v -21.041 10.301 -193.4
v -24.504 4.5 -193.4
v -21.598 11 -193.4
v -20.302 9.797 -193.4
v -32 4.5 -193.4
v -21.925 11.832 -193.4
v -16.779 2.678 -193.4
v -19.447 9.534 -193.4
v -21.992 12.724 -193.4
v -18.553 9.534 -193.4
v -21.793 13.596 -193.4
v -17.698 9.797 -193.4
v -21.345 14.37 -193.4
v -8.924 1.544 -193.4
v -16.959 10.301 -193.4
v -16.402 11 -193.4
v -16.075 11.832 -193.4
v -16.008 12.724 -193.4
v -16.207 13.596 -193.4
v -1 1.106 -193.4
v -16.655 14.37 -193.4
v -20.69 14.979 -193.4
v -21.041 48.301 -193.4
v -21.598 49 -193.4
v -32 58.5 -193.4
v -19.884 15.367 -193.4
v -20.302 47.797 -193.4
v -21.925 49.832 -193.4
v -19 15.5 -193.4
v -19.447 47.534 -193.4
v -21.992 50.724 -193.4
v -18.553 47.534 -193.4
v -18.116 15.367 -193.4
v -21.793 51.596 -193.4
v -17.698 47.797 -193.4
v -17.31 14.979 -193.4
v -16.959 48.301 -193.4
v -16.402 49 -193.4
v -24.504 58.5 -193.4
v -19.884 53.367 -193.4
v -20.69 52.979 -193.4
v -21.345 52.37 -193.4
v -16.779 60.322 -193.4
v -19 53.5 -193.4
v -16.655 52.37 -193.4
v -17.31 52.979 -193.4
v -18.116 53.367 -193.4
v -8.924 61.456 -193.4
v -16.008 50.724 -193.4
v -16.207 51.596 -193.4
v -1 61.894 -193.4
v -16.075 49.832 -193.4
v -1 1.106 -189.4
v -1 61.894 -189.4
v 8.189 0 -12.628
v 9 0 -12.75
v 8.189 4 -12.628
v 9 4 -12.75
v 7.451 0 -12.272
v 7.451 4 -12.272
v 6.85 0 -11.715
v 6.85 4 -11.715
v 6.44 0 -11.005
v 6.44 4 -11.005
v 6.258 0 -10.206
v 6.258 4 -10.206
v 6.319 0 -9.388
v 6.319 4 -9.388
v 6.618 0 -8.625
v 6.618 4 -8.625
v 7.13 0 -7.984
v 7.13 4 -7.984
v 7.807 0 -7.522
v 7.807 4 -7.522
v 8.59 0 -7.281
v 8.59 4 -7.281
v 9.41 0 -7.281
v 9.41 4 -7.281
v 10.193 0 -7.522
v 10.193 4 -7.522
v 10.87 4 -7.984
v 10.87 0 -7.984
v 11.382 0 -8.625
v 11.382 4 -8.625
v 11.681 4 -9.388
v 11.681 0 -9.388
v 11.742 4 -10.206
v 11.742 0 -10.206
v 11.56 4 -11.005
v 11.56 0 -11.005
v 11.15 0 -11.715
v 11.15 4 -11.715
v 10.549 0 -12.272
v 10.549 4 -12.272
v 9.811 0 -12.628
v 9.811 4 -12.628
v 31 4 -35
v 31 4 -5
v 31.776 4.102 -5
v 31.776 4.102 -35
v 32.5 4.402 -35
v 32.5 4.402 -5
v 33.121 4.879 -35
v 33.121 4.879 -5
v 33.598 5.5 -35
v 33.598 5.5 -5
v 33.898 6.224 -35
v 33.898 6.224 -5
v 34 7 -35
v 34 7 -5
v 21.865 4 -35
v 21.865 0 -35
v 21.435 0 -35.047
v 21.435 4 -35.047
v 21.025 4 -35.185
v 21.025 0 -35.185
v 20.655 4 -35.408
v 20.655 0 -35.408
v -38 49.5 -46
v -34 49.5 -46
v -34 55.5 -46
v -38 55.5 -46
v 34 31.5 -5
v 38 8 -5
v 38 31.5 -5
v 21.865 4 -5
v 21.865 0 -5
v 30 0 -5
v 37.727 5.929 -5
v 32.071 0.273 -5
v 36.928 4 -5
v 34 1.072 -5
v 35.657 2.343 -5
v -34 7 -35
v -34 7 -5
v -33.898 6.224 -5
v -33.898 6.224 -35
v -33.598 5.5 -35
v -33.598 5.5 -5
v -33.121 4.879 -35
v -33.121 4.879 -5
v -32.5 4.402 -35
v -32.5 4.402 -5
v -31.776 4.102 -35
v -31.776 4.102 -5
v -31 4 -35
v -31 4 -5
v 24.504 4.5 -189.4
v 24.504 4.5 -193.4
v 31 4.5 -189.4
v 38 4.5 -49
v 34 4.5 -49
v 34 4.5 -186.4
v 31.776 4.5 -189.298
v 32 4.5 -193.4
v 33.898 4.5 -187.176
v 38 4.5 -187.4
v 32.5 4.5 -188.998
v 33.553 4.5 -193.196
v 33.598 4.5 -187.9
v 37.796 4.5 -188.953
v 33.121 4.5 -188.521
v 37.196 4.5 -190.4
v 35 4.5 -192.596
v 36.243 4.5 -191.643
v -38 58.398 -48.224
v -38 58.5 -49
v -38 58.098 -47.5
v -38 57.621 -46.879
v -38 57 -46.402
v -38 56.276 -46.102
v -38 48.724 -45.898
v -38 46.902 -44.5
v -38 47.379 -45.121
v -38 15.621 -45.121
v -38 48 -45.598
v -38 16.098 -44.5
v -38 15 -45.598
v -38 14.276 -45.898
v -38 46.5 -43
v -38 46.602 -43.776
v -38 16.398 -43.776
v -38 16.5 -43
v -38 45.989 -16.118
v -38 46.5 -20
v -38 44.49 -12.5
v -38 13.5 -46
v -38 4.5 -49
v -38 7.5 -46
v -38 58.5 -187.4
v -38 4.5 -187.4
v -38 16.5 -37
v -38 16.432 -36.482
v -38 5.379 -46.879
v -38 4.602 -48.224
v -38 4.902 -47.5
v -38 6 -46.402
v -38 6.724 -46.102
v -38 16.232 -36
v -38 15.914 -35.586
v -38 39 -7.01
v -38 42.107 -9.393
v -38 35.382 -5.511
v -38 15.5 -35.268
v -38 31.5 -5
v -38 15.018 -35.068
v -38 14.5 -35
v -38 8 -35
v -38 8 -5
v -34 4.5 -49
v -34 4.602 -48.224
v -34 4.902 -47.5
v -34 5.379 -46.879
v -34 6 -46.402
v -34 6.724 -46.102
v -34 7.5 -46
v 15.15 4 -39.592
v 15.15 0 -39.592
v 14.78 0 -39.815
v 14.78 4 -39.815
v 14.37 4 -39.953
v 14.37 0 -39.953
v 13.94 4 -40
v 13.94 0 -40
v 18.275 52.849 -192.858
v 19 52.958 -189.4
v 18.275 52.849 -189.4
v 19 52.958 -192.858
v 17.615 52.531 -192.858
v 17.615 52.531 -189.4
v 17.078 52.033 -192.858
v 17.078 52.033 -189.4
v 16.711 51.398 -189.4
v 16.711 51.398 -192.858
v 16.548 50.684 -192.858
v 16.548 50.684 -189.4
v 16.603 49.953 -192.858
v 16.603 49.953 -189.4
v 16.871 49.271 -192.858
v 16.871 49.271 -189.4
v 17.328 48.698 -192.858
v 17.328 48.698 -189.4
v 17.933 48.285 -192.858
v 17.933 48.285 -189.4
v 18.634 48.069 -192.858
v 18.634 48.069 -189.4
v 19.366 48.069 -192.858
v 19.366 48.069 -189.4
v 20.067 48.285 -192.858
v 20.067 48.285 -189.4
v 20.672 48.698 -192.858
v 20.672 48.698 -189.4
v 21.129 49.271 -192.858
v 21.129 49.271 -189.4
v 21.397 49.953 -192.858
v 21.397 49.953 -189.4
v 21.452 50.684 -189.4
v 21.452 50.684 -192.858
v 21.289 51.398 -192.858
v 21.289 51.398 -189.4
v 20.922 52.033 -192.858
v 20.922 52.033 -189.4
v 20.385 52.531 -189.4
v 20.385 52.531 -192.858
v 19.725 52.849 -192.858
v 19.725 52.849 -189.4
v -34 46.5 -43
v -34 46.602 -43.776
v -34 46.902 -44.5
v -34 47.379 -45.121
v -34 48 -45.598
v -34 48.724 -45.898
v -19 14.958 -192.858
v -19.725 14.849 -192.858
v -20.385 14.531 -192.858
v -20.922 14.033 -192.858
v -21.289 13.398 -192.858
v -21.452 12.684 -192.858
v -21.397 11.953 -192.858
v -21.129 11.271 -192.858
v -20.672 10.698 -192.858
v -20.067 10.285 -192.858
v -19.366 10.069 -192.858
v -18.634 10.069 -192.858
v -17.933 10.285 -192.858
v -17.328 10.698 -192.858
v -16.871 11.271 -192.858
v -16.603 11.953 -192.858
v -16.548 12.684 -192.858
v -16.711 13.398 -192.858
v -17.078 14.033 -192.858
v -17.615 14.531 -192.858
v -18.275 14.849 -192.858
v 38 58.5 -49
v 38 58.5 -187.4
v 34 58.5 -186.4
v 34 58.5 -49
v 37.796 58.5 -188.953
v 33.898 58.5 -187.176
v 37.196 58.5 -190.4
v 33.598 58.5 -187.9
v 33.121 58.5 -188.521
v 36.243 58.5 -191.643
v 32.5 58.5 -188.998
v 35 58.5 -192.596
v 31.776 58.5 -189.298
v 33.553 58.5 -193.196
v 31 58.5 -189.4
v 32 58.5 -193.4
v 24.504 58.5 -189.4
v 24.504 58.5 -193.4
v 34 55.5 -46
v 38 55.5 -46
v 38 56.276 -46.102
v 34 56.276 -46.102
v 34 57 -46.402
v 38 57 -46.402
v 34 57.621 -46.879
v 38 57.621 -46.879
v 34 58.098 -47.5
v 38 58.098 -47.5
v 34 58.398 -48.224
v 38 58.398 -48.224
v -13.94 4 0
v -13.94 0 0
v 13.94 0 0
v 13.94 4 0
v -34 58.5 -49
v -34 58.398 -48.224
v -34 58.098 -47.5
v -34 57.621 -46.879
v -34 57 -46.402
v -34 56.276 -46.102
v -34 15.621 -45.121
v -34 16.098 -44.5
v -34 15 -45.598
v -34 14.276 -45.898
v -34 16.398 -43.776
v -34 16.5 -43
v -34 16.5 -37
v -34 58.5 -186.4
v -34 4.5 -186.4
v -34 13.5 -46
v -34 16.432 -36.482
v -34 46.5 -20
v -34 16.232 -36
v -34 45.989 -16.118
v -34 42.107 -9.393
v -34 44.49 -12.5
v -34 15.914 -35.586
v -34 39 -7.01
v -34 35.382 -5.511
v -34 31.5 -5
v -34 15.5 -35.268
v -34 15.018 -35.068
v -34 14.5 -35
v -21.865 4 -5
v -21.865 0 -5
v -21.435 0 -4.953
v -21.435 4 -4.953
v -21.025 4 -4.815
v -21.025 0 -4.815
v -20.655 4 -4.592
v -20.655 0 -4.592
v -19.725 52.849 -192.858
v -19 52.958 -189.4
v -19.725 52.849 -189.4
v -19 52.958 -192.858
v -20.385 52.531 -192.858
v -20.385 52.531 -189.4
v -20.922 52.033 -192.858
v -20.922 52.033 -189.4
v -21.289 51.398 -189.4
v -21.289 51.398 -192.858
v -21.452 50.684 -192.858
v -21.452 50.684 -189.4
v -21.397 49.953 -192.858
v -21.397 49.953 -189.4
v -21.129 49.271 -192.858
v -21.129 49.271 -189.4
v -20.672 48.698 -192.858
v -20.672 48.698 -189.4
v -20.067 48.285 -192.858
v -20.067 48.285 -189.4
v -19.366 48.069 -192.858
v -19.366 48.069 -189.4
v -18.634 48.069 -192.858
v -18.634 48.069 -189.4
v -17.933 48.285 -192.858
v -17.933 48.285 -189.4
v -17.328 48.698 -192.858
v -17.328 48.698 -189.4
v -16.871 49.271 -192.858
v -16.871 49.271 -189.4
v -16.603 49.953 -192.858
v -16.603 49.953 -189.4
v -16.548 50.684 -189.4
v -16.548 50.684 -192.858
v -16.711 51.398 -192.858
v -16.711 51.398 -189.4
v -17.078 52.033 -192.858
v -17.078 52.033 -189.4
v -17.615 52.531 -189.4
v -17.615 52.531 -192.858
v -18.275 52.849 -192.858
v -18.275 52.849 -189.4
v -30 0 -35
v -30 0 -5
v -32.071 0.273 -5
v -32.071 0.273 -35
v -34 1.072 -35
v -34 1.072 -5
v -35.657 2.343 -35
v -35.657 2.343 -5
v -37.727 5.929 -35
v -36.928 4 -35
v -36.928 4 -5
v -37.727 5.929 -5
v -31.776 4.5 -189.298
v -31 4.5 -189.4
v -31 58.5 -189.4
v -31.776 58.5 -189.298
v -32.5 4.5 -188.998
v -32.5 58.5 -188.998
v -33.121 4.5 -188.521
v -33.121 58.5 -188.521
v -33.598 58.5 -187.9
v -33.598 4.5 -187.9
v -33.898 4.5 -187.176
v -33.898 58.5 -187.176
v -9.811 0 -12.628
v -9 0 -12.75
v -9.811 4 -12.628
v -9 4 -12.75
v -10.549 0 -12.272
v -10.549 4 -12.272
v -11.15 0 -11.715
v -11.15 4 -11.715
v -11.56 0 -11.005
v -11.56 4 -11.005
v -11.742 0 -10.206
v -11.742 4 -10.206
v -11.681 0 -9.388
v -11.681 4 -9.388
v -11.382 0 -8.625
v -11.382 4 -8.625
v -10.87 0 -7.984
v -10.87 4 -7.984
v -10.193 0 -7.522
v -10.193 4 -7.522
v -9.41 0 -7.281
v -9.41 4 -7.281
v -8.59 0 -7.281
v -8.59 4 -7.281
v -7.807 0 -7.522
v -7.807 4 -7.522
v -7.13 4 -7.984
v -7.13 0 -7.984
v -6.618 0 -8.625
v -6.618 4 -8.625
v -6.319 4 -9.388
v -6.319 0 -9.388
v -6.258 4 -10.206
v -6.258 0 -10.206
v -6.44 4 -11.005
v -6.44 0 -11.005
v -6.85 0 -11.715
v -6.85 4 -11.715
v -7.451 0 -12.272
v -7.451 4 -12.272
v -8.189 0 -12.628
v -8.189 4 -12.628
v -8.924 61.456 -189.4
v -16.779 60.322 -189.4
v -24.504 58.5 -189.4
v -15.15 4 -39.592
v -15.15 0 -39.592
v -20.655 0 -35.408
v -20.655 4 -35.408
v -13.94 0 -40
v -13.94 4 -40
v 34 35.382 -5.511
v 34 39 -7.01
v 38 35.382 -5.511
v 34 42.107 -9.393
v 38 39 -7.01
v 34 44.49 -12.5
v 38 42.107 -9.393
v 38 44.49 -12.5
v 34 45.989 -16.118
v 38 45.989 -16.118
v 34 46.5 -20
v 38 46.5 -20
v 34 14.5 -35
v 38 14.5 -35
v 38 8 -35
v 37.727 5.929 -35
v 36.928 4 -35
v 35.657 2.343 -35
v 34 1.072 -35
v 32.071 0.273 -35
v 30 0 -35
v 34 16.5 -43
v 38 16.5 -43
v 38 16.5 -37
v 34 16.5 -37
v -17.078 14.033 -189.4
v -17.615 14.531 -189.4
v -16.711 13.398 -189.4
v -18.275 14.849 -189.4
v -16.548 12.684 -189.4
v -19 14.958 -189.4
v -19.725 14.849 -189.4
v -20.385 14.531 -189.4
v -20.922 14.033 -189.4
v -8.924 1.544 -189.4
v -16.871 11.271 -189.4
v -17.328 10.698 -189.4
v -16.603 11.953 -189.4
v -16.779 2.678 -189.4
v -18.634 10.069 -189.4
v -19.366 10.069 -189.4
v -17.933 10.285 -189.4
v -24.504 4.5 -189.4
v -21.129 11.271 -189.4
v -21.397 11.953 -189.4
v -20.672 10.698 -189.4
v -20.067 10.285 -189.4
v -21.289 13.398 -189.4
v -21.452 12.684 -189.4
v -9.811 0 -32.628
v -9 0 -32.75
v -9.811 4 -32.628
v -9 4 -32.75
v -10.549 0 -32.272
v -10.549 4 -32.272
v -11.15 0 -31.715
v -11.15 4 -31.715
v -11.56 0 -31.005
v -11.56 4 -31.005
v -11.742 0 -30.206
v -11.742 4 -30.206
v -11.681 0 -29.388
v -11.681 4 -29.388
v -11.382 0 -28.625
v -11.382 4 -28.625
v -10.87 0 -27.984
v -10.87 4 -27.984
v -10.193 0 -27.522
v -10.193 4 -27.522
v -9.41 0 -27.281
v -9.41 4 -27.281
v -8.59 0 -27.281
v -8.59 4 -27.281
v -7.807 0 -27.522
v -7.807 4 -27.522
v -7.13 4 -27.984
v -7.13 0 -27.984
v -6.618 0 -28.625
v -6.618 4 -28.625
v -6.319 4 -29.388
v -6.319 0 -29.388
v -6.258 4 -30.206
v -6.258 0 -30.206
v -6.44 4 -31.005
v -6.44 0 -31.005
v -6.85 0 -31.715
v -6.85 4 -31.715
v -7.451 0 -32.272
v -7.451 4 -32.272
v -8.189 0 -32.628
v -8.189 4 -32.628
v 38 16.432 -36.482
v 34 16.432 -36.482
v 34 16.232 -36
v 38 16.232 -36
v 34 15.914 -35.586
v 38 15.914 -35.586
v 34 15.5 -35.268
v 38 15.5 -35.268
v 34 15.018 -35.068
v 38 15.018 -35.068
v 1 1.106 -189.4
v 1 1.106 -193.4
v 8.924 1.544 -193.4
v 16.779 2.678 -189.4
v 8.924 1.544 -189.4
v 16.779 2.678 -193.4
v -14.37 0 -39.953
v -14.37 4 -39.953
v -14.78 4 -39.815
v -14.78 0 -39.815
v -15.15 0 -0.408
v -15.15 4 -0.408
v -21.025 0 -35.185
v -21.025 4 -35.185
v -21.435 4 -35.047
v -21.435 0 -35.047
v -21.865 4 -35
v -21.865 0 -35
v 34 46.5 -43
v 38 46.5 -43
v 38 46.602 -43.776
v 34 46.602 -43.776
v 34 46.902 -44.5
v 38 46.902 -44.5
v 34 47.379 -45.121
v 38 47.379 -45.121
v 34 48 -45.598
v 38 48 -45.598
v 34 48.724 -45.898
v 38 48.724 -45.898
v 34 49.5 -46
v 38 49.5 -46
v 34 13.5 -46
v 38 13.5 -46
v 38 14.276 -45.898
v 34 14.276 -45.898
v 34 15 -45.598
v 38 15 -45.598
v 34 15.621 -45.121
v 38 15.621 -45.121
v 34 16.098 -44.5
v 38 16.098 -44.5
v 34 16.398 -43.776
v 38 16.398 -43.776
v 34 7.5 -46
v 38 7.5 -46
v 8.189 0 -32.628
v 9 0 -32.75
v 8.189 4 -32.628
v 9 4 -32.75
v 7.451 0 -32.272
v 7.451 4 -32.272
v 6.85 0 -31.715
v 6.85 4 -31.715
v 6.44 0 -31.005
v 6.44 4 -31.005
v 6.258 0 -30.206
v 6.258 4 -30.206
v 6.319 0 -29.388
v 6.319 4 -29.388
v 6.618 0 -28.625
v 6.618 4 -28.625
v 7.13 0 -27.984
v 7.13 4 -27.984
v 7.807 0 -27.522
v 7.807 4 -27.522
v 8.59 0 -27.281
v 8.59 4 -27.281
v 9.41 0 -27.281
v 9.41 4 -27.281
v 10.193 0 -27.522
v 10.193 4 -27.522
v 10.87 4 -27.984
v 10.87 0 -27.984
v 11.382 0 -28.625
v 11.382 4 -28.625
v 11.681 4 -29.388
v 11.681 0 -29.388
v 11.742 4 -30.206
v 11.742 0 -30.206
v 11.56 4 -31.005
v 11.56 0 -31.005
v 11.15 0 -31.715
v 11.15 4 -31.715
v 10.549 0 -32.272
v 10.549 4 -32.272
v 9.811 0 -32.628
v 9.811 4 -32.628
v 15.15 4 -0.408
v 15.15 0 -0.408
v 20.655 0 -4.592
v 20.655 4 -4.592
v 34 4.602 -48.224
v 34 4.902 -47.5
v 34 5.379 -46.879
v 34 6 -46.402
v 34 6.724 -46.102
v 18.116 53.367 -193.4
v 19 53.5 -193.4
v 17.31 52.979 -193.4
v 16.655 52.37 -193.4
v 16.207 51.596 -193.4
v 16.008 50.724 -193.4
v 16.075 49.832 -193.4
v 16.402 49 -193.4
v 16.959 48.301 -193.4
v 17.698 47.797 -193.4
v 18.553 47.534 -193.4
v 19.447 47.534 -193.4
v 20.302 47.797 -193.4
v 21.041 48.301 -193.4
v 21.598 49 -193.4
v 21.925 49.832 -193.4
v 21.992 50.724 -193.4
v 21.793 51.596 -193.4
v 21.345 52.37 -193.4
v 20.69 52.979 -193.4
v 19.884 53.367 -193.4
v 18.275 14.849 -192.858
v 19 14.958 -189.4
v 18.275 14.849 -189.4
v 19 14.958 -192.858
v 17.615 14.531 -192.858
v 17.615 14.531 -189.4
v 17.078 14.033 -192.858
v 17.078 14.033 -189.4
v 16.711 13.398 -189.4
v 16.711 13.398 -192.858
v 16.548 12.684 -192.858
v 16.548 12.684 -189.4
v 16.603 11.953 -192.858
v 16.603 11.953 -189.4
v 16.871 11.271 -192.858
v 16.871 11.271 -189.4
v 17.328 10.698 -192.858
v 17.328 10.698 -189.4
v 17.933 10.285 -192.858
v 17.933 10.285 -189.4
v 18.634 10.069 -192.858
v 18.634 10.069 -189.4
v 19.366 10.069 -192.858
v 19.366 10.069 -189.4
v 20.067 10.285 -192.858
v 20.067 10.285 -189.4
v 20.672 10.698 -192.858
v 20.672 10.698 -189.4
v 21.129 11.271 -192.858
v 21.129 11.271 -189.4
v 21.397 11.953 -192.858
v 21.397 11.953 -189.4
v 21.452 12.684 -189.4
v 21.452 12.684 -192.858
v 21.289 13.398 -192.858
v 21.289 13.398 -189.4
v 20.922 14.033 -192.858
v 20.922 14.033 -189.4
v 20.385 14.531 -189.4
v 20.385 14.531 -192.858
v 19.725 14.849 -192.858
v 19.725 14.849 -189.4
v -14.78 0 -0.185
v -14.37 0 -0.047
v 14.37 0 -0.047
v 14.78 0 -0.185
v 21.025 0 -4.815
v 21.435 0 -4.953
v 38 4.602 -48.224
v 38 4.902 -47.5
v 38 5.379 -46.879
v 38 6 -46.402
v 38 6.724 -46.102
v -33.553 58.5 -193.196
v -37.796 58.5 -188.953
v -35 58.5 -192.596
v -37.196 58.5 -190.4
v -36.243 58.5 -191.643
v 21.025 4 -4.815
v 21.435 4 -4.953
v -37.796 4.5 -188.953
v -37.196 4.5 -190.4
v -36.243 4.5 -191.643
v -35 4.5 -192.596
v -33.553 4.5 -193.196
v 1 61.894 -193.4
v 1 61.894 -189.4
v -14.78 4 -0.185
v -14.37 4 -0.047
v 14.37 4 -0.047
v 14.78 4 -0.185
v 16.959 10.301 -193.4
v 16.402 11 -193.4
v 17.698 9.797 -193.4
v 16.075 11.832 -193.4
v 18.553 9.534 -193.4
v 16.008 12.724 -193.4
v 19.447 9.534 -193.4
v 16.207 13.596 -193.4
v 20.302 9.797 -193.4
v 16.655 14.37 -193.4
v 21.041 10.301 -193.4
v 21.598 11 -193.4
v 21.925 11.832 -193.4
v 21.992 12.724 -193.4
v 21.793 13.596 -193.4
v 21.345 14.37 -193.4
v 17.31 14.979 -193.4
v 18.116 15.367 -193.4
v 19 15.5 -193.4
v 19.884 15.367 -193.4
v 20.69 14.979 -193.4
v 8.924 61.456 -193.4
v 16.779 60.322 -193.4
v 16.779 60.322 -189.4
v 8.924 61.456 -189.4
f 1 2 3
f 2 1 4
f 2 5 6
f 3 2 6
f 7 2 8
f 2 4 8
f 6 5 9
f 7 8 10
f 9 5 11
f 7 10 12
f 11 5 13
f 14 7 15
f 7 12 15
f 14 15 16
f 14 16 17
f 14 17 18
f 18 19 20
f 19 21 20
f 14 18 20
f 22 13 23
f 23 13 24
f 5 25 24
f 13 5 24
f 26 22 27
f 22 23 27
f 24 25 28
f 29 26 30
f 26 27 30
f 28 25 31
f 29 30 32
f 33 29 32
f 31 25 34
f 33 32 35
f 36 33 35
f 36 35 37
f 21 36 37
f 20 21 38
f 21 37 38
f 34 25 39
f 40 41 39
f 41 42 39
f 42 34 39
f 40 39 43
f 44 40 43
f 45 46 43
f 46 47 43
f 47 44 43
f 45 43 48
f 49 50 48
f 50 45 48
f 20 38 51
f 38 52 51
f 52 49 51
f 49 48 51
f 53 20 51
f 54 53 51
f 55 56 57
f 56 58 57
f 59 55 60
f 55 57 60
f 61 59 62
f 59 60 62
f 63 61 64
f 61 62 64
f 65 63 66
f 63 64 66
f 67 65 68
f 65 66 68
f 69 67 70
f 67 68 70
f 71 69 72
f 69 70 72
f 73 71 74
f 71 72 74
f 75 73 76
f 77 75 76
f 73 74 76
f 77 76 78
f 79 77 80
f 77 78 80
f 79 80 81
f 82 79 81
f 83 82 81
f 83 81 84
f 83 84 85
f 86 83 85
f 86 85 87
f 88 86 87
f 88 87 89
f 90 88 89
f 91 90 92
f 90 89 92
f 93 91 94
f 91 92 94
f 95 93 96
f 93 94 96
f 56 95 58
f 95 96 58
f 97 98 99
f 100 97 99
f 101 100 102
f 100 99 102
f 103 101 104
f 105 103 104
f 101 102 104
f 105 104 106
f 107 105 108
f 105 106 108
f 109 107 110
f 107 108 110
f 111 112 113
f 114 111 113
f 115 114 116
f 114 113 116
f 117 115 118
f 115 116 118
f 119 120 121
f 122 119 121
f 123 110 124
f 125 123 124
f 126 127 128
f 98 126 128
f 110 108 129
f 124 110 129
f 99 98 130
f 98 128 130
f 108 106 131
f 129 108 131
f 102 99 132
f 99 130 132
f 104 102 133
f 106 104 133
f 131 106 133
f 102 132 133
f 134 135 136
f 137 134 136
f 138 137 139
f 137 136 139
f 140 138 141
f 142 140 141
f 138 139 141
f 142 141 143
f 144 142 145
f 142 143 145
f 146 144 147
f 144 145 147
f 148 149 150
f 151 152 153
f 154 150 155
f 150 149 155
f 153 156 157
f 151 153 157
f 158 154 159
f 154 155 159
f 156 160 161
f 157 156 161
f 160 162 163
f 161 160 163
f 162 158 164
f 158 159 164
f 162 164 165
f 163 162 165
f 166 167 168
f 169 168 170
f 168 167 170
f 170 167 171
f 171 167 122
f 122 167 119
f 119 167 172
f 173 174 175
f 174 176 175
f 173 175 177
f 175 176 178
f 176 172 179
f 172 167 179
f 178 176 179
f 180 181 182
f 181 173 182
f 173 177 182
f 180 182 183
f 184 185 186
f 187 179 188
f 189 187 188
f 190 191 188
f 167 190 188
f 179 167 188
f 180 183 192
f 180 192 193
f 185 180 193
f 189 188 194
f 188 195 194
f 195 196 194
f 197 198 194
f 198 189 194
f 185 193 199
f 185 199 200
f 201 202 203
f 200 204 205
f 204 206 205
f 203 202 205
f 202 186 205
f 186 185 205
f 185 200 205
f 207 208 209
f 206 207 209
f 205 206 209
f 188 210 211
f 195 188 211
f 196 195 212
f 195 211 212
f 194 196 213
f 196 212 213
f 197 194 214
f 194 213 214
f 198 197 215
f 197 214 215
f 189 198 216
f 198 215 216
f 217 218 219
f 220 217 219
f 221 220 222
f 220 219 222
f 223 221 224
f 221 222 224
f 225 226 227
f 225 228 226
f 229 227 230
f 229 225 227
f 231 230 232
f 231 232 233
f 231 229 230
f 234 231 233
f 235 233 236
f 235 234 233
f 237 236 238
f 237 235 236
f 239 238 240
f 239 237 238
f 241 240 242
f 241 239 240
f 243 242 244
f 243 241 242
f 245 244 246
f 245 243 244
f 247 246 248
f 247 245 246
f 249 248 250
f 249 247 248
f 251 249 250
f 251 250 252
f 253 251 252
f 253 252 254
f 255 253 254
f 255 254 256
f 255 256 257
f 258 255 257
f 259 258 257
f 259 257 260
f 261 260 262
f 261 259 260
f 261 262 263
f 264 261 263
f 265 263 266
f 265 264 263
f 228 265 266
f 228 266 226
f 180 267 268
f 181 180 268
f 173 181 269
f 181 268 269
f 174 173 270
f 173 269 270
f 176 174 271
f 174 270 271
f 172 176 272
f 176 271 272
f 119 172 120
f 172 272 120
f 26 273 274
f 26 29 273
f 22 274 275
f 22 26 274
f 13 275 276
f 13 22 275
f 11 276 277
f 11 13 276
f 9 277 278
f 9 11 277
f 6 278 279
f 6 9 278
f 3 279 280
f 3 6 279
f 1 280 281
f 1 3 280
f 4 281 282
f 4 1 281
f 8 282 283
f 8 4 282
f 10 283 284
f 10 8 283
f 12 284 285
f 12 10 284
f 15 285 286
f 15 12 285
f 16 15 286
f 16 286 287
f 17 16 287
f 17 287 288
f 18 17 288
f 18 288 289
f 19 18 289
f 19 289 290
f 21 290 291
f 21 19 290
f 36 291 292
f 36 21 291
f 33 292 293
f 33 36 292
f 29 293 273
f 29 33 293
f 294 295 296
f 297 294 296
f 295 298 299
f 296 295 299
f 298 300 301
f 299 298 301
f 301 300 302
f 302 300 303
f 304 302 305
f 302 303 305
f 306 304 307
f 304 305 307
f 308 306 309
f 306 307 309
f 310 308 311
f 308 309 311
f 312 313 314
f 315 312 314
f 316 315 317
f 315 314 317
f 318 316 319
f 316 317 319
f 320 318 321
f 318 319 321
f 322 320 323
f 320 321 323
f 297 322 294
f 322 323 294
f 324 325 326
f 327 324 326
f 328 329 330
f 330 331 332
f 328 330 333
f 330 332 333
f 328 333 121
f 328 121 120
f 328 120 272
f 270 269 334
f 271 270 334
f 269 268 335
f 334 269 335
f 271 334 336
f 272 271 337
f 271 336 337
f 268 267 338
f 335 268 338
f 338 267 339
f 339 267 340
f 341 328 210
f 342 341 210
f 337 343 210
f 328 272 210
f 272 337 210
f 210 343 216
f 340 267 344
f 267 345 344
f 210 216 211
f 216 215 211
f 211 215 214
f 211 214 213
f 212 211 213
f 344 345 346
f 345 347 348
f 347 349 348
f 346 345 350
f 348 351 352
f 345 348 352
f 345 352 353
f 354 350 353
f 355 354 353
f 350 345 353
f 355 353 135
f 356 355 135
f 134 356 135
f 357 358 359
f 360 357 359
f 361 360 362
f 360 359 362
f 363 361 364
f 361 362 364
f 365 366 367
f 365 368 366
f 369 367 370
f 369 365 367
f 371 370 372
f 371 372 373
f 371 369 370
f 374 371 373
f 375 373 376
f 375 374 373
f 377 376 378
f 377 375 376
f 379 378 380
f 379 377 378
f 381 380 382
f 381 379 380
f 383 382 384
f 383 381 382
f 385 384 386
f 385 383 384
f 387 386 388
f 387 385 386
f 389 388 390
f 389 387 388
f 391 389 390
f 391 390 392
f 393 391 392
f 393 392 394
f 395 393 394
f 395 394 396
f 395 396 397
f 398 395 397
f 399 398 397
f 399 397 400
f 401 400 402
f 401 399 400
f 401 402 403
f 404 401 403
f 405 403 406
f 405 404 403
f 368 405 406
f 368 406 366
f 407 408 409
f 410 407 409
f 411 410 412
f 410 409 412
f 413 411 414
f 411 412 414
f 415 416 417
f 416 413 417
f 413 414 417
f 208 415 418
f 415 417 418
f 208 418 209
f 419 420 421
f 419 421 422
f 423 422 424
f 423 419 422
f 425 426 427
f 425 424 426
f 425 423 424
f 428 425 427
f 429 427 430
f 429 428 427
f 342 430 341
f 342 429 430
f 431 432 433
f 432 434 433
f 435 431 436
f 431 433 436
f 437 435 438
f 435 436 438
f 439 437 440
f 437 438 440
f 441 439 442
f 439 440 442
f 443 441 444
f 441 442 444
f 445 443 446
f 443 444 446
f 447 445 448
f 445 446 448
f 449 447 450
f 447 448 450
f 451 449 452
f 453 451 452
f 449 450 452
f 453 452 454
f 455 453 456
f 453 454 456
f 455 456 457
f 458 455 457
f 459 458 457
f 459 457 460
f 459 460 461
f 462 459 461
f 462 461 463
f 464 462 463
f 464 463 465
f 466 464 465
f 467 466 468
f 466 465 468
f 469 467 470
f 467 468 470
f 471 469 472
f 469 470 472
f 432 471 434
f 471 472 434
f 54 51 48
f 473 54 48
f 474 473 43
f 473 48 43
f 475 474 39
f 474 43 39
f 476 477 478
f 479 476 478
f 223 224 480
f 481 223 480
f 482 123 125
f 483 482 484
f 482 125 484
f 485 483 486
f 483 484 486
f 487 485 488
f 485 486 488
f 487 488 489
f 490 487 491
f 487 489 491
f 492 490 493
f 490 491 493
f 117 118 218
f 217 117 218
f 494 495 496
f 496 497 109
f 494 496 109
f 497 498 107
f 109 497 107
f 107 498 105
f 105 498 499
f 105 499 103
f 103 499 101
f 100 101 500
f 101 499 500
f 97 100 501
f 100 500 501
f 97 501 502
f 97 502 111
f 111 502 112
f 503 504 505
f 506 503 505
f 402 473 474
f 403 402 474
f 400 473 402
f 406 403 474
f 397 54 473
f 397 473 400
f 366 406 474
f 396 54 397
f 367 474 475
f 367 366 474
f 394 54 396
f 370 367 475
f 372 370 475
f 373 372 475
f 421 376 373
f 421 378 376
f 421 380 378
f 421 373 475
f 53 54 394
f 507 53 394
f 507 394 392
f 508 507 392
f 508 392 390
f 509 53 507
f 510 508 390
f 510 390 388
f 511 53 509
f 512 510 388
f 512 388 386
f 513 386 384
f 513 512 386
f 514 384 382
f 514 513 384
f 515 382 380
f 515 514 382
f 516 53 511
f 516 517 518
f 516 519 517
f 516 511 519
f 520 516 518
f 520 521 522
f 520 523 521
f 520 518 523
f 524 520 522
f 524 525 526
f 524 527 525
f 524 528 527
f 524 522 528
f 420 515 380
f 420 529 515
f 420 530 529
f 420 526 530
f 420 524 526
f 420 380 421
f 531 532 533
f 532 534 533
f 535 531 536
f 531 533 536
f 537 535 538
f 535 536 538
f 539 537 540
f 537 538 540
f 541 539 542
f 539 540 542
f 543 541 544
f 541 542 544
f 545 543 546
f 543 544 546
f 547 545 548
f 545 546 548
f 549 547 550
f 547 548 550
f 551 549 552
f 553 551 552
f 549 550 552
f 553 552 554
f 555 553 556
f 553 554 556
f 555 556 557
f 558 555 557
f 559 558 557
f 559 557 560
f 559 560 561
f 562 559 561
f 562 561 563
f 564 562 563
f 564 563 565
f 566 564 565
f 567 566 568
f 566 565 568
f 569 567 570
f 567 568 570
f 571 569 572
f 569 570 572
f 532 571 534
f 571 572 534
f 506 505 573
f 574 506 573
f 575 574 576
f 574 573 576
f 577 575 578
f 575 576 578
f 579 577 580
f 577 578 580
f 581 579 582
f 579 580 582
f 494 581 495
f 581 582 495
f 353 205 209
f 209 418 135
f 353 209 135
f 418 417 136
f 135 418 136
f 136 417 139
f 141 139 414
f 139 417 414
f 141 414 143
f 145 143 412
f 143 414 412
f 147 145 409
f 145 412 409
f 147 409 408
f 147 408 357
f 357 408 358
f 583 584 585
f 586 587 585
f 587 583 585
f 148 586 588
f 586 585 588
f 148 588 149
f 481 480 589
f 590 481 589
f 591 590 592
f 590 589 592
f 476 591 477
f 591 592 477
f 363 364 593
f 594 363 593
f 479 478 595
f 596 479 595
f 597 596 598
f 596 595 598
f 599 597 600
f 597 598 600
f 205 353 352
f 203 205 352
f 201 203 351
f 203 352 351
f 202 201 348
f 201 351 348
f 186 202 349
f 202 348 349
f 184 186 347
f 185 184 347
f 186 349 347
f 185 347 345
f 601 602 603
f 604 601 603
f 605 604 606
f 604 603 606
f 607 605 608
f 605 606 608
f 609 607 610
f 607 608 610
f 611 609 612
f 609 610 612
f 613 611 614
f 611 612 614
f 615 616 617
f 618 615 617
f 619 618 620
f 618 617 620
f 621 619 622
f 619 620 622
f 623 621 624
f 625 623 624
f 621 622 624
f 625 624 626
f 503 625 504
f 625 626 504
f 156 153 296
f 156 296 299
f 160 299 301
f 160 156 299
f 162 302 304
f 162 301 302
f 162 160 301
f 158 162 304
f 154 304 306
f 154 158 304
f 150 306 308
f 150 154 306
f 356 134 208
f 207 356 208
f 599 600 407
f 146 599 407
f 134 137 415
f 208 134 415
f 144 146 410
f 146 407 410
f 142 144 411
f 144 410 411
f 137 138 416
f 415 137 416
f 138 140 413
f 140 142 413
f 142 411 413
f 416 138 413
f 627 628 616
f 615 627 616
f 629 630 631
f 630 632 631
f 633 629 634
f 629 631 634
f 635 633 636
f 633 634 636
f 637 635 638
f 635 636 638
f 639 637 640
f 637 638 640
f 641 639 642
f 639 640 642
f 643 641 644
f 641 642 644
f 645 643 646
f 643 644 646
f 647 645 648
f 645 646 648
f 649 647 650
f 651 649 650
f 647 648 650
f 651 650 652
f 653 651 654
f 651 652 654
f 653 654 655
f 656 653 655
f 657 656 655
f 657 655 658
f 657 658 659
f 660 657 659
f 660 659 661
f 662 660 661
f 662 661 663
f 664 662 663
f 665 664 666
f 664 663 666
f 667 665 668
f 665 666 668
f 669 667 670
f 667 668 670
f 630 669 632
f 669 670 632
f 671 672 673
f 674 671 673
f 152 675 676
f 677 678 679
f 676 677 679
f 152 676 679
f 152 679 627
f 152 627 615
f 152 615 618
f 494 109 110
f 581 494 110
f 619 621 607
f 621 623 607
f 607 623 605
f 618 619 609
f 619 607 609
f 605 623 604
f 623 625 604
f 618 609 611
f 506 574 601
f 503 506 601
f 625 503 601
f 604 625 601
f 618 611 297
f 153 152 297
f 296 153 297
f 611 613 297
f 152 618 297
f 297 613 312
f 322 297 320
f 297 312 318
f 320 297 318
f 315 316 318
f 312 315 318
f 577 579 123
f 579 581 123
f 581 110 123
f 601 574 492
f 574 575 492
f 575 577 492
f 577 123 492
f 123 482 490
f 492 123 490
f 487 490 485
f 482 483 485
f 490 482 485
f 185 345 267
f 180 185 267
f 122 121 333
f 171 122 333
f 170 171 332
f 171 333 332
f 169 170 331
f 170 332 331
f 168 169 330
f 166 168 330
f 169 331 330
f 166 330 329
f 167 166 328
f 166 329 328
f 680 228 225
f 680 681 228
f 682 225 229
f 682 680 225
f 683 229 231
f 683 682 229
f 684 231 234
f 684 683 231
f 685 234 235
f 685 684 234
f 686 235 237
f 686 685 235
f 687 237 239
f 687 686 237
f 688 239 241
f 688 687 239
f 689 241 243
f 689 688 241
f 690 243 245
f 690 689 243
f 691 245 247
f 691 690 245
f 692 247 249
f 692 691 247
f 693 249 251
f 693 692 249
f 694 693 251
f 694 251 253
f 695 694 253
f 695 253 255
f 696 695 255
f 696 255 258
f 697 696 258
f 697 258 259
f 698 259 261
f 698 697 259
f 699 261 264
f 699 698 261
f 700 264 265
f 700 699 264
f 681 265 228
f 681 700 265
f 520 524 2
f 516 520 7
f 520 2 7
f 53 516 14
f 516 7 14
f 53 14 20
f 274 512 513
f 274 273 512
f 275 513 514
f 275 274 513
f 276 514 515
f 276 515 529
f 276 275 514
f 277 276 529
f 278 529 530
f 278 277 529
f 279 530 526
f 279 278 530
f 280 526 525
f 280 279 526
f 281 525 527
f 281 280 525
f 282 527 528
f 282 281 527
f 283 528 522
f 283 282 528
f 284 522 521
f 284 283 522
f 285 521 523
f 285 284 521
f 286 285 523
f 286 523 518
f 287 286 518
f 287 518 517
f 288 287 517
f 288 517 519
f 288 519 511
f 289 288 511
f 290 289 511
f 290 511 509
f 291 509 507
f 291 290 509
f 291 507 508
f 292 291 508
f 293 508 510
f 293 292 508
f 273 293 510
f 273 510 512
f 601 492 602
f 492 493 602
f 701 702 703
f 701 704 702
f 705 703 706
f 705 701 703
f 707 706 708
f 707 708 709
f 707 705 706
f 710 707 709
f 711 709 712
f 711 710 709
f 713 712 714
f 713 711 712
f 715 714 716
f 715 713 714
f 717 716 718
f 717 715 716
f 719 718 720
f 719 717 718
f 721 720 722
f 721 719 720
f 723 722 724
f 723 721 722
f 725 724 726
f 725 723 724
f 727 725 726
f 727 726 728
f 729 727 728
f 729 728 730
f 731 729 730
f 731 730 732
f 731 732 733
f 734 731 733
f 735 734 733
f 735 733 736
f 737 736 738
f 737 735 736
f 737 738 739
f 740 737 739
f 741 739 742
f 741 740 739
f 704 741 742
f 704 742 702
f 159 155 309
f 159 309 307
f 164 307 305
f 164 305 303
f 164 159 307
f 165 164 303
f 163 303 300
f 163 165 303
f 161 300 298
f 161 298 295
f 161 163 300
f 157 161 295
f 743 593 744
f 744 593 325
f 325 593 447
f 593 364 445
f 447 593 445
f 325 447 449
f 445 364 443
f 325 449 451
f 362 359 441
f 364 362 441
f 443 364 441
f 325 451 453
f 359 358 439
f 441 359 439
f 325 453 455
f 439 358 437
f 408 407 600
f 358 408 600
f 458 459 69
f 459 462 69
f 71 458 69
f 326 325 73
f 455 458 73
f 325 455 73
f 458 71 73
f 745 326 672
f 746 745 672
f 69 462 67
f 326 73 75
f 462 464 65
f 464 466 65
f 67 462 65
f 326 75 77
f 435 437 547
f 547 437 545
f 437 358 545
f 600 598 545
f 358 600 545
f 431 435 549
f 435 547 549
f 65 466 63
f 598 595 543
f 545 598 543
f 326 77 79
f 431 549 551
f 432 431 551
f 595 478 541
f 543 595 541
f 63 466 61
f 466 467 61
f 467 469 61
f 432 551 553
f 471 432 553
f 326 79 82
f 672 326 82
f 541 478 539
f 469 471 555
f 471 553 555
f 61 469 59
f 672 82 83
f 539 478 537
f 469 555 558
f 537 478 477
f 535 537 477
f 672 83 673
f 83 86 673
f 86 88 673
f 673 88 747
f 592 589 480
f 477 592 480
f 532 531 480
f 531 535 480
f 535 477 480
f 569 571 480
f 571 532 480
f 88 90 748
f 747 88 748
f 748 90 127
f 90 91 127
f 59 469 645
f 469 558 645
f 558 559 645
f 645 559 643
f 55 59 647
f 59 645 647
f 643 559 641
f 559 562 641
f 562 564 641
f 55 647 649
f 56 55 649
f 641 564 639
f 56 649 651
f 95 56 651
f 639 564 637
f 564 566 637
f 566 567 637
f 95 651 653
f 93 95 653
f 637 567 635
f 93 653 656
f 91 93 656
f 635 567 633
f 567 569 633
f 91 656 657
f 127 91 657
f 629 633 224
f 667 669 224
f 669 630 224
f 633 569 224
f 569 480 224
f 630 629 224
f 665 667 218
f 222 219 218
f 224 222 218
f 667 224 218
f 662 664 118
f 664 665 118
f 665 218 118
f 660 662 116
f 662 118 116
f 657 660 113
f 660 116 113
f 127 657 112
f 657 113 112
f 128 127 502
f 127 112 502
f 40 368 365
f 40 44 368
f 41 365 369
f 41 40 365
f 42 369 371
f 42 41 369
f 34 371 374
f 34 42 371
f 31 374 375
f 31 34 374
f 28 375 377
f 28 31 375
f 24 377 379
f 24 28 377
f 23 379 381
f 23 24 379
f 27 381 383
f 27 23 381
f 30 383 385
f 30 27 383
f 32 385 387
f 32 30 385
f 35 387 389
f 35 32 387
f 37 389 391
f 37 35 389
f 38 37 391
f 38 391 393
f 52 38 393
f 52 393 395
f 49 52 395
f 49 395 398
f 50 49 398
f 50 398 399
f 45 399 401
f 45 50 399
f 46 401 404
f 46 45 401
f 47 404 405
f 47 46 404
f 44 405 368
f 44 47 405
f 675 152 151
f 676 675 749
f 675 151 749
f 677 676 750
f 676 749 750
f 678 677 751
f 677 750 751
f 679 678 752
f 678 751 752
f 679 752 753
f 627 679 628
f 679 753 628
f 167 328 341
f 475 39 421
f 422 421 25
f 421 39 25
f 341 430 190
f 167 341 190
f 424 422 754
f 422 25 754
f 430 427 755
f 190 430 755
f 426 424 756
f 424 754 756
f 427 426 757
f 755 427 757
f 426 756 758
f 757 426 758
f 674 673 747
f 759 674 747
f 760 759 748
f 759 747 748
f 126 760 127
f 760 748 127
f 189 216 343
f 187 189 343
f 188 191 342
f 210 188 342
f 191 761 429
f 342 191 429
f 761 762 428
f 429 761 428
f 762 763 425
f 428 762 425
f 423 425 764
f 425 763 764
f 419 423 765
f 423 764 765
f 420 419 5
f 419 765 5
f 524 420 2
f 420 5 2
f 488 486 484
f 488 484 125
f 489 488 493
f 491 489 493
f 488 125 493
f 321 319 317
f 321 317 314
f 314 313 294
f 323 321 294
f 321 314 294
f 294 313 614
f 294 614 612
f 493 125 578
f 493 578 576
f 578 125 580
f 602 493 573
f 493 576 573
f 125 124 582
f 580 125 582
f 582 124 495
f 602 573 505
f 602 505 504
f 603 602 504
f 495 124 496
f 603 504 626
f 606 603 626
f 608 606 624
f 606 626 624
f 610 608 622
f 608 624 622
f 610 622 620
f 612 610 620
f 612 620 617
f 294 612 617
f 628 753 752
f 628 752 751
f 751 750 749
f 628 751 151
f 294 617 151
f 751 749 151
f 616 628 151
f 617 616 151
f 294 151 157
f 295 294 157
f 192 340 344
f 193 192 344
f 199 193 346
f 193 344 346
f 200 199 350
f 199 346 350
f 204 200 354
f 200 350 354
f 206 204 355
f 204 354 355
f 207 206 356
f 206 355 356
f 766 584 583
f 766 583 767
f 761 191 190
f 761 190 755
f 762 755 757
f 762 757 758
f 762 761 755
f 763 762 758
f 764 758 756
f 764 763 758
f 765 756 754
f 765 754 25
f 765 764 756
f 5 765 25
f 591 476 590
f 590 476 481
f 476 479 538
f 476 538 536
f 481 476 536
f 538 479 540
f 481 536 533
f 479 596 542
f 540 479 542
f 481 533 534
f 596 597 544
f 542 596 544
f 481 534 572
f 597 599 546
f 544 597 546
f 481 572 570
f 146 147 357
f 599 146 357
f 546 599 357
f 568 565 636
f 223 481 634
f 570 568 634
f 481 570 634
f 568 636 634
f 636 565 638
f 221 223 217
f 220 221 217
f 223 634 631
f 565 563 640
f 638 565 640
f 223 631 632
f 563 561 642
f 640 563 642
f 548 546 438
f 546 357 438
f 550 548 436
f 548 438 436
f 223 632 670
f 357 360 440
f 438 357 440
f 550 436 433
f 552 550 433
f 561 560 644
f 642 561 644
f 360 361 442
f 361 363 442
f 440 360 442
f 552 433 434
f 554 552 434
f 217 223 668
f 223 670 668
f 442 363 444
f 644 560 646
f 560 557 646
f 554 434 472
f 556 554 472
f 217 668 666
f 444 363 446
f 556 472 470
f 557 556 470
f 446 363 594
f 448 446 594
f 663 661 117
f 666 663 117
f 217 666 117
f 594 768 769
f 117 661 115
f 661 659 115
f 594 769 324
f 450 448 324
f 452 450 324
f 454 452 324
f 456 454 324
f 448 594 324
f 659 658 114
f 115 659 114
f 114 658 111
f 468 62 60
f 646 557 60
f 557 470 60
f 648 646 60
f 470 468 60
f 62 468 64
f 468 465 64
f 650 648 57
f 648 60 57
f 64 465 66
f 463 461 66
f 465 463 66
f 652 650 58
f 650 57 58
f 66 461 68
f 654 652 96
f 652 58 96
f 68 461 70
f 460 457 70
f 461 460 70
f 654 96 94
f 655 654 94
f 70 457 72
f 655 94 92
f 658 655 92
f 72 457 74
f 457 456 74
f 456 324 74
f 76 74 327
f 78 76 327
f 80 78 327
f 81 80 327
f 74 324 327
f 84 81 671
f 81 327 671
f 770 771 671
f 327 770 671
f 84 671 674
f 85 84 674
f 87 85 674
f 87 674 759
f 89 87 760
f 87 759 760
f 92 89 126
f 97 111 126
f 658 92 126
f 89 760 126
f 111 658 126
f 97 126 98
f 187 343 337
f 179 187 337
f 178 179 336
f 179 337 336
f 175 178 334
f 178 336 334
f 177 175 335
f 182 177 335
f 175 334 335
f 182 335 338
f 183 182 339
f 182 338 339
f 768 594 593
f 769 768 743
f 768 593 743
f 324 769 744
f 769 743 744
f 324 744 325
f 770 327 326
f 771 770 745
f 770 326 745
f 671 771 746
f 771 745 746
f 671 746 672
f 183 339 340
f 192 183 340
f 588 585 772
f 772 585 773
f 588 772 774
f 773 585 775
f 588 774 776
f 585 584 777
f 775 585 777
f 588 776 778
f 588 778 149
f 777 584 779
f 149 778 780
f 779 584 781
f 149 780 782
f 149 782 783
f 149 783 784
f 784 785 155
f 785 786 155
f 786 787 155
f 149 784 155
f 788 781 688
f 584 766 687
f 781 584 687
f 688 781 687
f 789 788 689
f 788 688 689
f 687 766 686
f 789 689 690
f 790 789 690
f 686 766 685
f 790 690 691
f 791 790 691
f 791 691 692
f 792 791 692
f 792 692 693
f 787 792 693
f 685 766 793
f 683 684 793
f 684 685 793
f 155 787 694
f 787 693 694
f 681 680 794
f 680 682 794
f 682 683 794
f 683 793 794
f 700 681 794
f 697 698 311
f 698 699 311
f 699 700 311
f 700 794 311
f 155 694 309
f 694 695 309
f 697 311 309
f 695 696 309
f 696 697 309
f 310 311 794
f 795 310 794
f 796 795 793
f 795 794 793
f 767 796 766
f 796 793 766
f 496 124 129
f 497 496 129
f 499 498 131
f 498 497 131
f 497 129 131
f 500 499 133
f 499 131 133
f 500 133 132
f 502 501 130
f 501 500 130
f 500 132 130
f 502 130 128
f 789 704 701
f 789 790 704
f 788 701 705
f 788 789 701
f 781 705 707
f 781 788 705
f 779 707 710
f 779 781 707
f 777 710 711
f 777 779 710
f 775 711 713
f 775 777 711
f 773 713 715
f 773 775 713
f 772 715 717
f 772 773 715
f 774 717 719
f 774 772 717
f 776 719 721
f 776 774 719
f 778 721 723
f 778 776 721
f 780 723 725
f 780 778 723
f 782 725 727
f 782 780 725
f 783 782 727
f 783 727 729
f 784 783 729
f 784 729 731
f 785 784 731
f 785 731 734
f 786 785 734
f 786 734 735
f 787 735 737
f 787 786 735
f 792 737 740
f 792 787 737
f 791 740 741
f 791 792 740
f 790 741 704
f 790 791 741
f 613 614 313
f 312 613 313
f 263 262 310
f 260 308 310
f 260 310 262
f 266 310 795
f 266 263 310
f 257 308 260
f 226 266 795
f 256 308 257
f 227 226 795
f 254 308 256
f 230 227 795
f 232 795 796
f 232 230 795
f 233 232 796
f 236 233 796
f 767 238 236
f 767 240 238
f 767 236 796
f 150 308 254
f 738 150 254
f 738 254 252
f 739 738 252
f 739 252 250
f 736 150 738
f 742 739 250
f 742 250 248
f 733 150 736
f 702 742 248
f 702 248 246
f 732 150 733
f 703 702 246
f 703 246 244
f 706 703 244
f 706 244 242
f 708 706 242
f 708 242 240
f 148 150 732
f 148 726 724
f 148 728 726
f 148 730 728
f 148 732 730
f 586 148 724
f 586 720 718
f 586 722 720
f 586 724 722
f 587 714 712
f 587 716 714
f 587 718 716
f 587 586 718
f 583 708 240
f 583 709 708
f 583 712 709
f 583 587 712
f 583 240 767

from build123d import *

# Parameters (mm, degrees)
BOSS_EXTRUDE1_DEPTH     = 193.4
CUT_EXTRUDE1_DEPTH      = 38
CUT_EXTRUDE1_DEPTH_BACK = 38
BOSS_EXTRUDE2_DEPTH     = 4.5
CUT_EXTRUDE2_DEPTH      = 40
CUT_EXTRUDE3_DEPTH      = 42
CUT_EXTRUDE4_DEPTH      = 81.5
CUT_EXTRUDE5_DEPTH      = 81.5
SKETCH8_W               = 2
SKETCH8_H               = 108
CUT_EXTRUDE6_DEPTH      = 4
SKETCH9_W               = 2.75
SKETCH9_H               = 4
LPATTERN1_COUNT         = 2
LPATTERN1_PITCH         = 20
LPATTERN1_COUNT_DIR2    = 2
LPATTERN1_PITCH_DIR2    = 18
LPATTERN2_COUNT         = 2
LPATTERN2_PITCH         = 38
LPATTERN2_COUNT_DIR2    = 2
LPATTERN2_PITCH_DIR2    = 38


with BuildPart() as part:
    # Sketch1 → Boss-Extrude1 (new body)
    with BuildSketch(Plane.XY.offset(-193.4)):
        with BuildLine():
            Line((-38, 58.5), (-38, 4.5))
            Line((-38, 4.5), (-24.503877244, 4.5))
            ThreePointArc((-24.503877244, 4.5), (0, 1.1), (24.503877244, 4.5))
            Line((24.503877244, 4.5), (38, 4.5))
            Line((38, 4.5), (38, 58.5))
            Line((38, 58.5), (24.503877244, 58.5))
            ThreePointArc((24.503877244, 58.5), (0, 61.9), (-24.503877244, 58.5))
            Line((-24.503877244, 58.5), (-38, 58.5))
        make_face()
    extrude(amount=BOSS_EXTRUDE1_DEPTH)

    # Sketch2 → Cut-Extrude1 (cut, two sides: drawn at the far end of the back side and taken through both)
    with BuildSketch(Plane(origin=(0, 0, 0), x_dir=(0, 0, -1), z_dir=(1, 0, 0)).offset(-CUT_EXTRUDE1_DEPTH_BACK)):
        with BuildLine():
            Line((0, -5), (189.4, -5))
            Line((189.4, -5), (189.4, 4.5))
            Line((189.4, 4.5), (49, 4.5))
            ThreePointArc((49, 4.5), (46.878679656, 5.378679656), (46, 7.5))
            Line((46, 7.5), (46, 13.5))
            ThreePointArc((46, 13.5), (45.121320344, 15.621320344), (43, 16.5))
            Line((43, 16.5), (37, 16.5))
            ThreePointArc((37, 16.5), (35.585786438, 15.914213562), (35, 14.5))
            Line((35, 14.5), (35, 0))
            Line((35, 0), (5, 0))
            Line((5, 0), (5, 31.5))
            ThreePointArc((5, 31.5), (9.393398282, 42.106601718), (20, 46.5))
            Line((20, 46.5), (43, 46.5))
            ThreePointArc((43, 46.5), (45.121320344, 47.378679656), (46, 49.5))
            Line((46, 49.5), (46, 55.5))
            ThreePointArc((46, 55.5), (46.878679656, 57.621320344), (49, 58.5))
            Line((49, 58.5), (189.4, 58.5))
            Line((189.4, 58.5), (189.4, 63.5))
            Line((189.4, 63.5), (0, 63.5))
            Line((0, 63.5), (0, -5))
        make_face()
    extrude(amount=CUT_EXTRUDE1_DEPTH + CUT_EXTRUDE1_DEPTH_BACK, mode=Mode.SUBTRACT)

    # Sketch3 → Boss-Extrude2 (add)
    with BuildSketch(Plane(origin=(0, 0, 0), x_dir=(1, 0, 0), z_dir=(0, 1, 0))):
        with BuildLine():
            Line((-38, 5), (-21.865, 5))
            ThreePointArc((-21.865, 5), (-21.226384959, 4.895302306), (-20.654631441, 4.59217083))
            Line((-20.654631441, 4.59217083), (-15.150368559, 0.40782917))
            ThreePointArc((-15.150368559, 0.40782917), (-14.578615041, 0.104697694), (-13.94, 0))
            Line((-13.94, 0), (13.94, 0))
            ThreePointArc((13.94, 0), (14.578615041, 0.104697694), (15.150368559, 0.40782917))
            Line((15.150368559, 0.40782917), (20.654631441, 4.59217083))
            ThreePointArc((20.654631441, 4.59217083), (21.226384959, 4.895302306), (21.865, 5))
            Line((21.865, 5), (38, 5))
            Line((38, 5), (38, 35))
            Line((38, 35), (21.865, 35))
            ThreePointArc((21.865, 35), (21.226384959, 35.104697694), (20.654631441, 35.40782917))
            Line((20.654631441, 35.40782917), (15.150368559, 39.59217083))
            ThreePointArc((15.150368559, 39.59217083), (14.578615041, 39.895302306), (13.94, 40))
            Line((13.94, 40), (-13.94, 40))
            ThreePointArc((-13.94, 40), (-14.578615041, 39.895302306), (-15.150368559, 39.59217083))
            Line((-15.150368559, 39.59217083), (-20.654631441, 35.40782917))
            ThreePointArc((-20.654631441, 35.40782917), (-21.226384959, 35.104697694), (-21.865, 35))
            Line((-21.865, 35), (-38, 35))
            Line((-38, 35), (-38, 5))
        make_face()
    extrude(amount=BOSS_EXTRUDE2_DEPTH)

    # Sketch4 → Cut-Extrude2 (cut)
    with BuildSketch(Plane.XY):
        with BuildLine():
            Line((-38, -5), (38, -5))
            Line((38, -5), (38, 8))
            ThreePointArc((38, 8), (35.656854249, 2.343145751), (30, 0))
            Line((30, 0), (-30, 0))
            ThreePointArc((-30, 0), (-35.656854249, 2.343145751), (-38, 8))
            Line((-38, 8), (-38, -5))
        make_face()
    extrude(amount=-CUT_EXTRUDE2_DEPTH, mode=Mode.SUBTRACT)

    # Sketch5 → Cut-Extrude3 (cut)
    with BuildSketch(Plane.XY):
        with BuildLine():
            Line((-31, 4), (31, 4))
            ThreePointArc((31, 4), (33.121320344, 4.878679656), (34, 7))
            Line((34, 7), (34, 62))
            Line((34, 62), (-34, 62))
            Line((-34, 62), (-34, 7))
            ThreePointArc((-34, 7), (-33.121320344, 4.878679656), (-31, 4))
        make_face()
    extrude(amount=-CUT_EXTRUDE3_DEPTH, mode=Mode.SUBTRACT)

    # Sketch6 → Cut-Extrude4 (cut)
    with BuildSketch(Plane(origin=(0, 0, 0), x_dir=(1, 0, 0), z_dir=(0, 1, 0))):
        with BuildLine():
            Line((-34, 186.4), (-34, 41))
            Line((-34, 41), (34, 41))
            Line((34, 41), (34, 186.4))
            ThreePointArc((34, 186.4), (33.121320344, 188.521320344), (31, 189.4))
            Line((31, 189.4), (-31, 189.4))
            ThreePointArc((-31, 189.4), (-33.121320344, 188.521320344), (-34, 186.4))
        make_face()
    extrude(amount=CUT_EXTRUDE4_DEPTH, mode=Mode.SUBTRACT)

    # Sketch7 → Cut-Extrude5 (cut)
    with BuildSketch(Plane(origin=(0, 0, 0), x_dir=(1, 0, 0), z_dir=(0, 1, 0))):
        with BuildLine():
            Line((-32, 193.4), (32, 193.4))
            ThreePointArc((32, 193.4), (36.242640687, 191.642640687), (38, 187.4))
            Line((38, 187.4), (38, 198.4))
            Line((38, 198.4), (-38, 198.4))
            Line((-38, 198.4), (-38, 187.4))
            ThreePointArc((-38, 187.4), (-36.242640687, 191.642640687), (-32, 193.4))
        make_face()
    extrude(amount=CUT_EXTRUDE5_DEPTH, mode=Mode.SUBTRACT)

    # Sketch8 → Cut-Extrude6 (cut)
    with BuildSketch(Plane.XY.offset(-193.4)):
        with Locations((0, 54)):
            Rectangle(SKETCH8_W, SKETCH8_H)
    extrude(amount=CUT_EXTRUDE6_DEPTH, mode=Mode.SUBTRACT)

    # Sketch9 → Cut-Revolve1 (revolve, cut)
    with BuildSketch(Plane(origin=(9, 0, 0), x_dir=(0, 0, -1), z_dir=(1, 0, 0))):
        with Locations((11.375, 2)):
            Rectangle(SKETCH9_W, SKETCH9_H)
    cut_revolve1 = revolve(axis=Axis((9, 0, -10), (0, 1, 0)), mode=Mode.SUBTRACT)

    # LPattern1: Cut-Revolve1 2 × 2
    with Locations(*[(-j * LPATTERN1_PITCH_DIR2, 0, -i * LPATTERN1_PITCH) for i in range(LPATTERN1_COUNT) for j in range(LPATTERN1_COUNT_DIR2) if (i, j) != (0, 0)]):
        add(cut_revolve1, mode=Mode.SUBTRACT)

    # Sketch11 → Cut-Revolve2 (revolve, cut)
    with BuildSketch(Plane(origin=(19, 0, 0), x_dir=(0, 0, -1), z_dir=(1, 0, 0))):
        Polygon((189.4, 12.5), (189.4, 14.9585), (192.8585, 14.9585), (193.4, 15.5), (193.4, 12.5), align=None)
    cut_revolve2 = revolve(axis=Axis((19, 12.5, -193.4), (0, 0, 1)), mode=Mode.SUBTRACT)

    # LPattern2: Cut-Revolve2 2 × 2
    with Locations(*[(-j * LPATTERN2_PITCH_DIR2, i * LPATTERN2_PITCH, 0) for i in range(LPATTERN2_COUNT) for j in range(LPATTERN2_COUNT_DIR2) if (i, j) != (0, 0)]):
        add(cut_revolve2, mode=Mode.SUBTRACT)


solid = part.part
